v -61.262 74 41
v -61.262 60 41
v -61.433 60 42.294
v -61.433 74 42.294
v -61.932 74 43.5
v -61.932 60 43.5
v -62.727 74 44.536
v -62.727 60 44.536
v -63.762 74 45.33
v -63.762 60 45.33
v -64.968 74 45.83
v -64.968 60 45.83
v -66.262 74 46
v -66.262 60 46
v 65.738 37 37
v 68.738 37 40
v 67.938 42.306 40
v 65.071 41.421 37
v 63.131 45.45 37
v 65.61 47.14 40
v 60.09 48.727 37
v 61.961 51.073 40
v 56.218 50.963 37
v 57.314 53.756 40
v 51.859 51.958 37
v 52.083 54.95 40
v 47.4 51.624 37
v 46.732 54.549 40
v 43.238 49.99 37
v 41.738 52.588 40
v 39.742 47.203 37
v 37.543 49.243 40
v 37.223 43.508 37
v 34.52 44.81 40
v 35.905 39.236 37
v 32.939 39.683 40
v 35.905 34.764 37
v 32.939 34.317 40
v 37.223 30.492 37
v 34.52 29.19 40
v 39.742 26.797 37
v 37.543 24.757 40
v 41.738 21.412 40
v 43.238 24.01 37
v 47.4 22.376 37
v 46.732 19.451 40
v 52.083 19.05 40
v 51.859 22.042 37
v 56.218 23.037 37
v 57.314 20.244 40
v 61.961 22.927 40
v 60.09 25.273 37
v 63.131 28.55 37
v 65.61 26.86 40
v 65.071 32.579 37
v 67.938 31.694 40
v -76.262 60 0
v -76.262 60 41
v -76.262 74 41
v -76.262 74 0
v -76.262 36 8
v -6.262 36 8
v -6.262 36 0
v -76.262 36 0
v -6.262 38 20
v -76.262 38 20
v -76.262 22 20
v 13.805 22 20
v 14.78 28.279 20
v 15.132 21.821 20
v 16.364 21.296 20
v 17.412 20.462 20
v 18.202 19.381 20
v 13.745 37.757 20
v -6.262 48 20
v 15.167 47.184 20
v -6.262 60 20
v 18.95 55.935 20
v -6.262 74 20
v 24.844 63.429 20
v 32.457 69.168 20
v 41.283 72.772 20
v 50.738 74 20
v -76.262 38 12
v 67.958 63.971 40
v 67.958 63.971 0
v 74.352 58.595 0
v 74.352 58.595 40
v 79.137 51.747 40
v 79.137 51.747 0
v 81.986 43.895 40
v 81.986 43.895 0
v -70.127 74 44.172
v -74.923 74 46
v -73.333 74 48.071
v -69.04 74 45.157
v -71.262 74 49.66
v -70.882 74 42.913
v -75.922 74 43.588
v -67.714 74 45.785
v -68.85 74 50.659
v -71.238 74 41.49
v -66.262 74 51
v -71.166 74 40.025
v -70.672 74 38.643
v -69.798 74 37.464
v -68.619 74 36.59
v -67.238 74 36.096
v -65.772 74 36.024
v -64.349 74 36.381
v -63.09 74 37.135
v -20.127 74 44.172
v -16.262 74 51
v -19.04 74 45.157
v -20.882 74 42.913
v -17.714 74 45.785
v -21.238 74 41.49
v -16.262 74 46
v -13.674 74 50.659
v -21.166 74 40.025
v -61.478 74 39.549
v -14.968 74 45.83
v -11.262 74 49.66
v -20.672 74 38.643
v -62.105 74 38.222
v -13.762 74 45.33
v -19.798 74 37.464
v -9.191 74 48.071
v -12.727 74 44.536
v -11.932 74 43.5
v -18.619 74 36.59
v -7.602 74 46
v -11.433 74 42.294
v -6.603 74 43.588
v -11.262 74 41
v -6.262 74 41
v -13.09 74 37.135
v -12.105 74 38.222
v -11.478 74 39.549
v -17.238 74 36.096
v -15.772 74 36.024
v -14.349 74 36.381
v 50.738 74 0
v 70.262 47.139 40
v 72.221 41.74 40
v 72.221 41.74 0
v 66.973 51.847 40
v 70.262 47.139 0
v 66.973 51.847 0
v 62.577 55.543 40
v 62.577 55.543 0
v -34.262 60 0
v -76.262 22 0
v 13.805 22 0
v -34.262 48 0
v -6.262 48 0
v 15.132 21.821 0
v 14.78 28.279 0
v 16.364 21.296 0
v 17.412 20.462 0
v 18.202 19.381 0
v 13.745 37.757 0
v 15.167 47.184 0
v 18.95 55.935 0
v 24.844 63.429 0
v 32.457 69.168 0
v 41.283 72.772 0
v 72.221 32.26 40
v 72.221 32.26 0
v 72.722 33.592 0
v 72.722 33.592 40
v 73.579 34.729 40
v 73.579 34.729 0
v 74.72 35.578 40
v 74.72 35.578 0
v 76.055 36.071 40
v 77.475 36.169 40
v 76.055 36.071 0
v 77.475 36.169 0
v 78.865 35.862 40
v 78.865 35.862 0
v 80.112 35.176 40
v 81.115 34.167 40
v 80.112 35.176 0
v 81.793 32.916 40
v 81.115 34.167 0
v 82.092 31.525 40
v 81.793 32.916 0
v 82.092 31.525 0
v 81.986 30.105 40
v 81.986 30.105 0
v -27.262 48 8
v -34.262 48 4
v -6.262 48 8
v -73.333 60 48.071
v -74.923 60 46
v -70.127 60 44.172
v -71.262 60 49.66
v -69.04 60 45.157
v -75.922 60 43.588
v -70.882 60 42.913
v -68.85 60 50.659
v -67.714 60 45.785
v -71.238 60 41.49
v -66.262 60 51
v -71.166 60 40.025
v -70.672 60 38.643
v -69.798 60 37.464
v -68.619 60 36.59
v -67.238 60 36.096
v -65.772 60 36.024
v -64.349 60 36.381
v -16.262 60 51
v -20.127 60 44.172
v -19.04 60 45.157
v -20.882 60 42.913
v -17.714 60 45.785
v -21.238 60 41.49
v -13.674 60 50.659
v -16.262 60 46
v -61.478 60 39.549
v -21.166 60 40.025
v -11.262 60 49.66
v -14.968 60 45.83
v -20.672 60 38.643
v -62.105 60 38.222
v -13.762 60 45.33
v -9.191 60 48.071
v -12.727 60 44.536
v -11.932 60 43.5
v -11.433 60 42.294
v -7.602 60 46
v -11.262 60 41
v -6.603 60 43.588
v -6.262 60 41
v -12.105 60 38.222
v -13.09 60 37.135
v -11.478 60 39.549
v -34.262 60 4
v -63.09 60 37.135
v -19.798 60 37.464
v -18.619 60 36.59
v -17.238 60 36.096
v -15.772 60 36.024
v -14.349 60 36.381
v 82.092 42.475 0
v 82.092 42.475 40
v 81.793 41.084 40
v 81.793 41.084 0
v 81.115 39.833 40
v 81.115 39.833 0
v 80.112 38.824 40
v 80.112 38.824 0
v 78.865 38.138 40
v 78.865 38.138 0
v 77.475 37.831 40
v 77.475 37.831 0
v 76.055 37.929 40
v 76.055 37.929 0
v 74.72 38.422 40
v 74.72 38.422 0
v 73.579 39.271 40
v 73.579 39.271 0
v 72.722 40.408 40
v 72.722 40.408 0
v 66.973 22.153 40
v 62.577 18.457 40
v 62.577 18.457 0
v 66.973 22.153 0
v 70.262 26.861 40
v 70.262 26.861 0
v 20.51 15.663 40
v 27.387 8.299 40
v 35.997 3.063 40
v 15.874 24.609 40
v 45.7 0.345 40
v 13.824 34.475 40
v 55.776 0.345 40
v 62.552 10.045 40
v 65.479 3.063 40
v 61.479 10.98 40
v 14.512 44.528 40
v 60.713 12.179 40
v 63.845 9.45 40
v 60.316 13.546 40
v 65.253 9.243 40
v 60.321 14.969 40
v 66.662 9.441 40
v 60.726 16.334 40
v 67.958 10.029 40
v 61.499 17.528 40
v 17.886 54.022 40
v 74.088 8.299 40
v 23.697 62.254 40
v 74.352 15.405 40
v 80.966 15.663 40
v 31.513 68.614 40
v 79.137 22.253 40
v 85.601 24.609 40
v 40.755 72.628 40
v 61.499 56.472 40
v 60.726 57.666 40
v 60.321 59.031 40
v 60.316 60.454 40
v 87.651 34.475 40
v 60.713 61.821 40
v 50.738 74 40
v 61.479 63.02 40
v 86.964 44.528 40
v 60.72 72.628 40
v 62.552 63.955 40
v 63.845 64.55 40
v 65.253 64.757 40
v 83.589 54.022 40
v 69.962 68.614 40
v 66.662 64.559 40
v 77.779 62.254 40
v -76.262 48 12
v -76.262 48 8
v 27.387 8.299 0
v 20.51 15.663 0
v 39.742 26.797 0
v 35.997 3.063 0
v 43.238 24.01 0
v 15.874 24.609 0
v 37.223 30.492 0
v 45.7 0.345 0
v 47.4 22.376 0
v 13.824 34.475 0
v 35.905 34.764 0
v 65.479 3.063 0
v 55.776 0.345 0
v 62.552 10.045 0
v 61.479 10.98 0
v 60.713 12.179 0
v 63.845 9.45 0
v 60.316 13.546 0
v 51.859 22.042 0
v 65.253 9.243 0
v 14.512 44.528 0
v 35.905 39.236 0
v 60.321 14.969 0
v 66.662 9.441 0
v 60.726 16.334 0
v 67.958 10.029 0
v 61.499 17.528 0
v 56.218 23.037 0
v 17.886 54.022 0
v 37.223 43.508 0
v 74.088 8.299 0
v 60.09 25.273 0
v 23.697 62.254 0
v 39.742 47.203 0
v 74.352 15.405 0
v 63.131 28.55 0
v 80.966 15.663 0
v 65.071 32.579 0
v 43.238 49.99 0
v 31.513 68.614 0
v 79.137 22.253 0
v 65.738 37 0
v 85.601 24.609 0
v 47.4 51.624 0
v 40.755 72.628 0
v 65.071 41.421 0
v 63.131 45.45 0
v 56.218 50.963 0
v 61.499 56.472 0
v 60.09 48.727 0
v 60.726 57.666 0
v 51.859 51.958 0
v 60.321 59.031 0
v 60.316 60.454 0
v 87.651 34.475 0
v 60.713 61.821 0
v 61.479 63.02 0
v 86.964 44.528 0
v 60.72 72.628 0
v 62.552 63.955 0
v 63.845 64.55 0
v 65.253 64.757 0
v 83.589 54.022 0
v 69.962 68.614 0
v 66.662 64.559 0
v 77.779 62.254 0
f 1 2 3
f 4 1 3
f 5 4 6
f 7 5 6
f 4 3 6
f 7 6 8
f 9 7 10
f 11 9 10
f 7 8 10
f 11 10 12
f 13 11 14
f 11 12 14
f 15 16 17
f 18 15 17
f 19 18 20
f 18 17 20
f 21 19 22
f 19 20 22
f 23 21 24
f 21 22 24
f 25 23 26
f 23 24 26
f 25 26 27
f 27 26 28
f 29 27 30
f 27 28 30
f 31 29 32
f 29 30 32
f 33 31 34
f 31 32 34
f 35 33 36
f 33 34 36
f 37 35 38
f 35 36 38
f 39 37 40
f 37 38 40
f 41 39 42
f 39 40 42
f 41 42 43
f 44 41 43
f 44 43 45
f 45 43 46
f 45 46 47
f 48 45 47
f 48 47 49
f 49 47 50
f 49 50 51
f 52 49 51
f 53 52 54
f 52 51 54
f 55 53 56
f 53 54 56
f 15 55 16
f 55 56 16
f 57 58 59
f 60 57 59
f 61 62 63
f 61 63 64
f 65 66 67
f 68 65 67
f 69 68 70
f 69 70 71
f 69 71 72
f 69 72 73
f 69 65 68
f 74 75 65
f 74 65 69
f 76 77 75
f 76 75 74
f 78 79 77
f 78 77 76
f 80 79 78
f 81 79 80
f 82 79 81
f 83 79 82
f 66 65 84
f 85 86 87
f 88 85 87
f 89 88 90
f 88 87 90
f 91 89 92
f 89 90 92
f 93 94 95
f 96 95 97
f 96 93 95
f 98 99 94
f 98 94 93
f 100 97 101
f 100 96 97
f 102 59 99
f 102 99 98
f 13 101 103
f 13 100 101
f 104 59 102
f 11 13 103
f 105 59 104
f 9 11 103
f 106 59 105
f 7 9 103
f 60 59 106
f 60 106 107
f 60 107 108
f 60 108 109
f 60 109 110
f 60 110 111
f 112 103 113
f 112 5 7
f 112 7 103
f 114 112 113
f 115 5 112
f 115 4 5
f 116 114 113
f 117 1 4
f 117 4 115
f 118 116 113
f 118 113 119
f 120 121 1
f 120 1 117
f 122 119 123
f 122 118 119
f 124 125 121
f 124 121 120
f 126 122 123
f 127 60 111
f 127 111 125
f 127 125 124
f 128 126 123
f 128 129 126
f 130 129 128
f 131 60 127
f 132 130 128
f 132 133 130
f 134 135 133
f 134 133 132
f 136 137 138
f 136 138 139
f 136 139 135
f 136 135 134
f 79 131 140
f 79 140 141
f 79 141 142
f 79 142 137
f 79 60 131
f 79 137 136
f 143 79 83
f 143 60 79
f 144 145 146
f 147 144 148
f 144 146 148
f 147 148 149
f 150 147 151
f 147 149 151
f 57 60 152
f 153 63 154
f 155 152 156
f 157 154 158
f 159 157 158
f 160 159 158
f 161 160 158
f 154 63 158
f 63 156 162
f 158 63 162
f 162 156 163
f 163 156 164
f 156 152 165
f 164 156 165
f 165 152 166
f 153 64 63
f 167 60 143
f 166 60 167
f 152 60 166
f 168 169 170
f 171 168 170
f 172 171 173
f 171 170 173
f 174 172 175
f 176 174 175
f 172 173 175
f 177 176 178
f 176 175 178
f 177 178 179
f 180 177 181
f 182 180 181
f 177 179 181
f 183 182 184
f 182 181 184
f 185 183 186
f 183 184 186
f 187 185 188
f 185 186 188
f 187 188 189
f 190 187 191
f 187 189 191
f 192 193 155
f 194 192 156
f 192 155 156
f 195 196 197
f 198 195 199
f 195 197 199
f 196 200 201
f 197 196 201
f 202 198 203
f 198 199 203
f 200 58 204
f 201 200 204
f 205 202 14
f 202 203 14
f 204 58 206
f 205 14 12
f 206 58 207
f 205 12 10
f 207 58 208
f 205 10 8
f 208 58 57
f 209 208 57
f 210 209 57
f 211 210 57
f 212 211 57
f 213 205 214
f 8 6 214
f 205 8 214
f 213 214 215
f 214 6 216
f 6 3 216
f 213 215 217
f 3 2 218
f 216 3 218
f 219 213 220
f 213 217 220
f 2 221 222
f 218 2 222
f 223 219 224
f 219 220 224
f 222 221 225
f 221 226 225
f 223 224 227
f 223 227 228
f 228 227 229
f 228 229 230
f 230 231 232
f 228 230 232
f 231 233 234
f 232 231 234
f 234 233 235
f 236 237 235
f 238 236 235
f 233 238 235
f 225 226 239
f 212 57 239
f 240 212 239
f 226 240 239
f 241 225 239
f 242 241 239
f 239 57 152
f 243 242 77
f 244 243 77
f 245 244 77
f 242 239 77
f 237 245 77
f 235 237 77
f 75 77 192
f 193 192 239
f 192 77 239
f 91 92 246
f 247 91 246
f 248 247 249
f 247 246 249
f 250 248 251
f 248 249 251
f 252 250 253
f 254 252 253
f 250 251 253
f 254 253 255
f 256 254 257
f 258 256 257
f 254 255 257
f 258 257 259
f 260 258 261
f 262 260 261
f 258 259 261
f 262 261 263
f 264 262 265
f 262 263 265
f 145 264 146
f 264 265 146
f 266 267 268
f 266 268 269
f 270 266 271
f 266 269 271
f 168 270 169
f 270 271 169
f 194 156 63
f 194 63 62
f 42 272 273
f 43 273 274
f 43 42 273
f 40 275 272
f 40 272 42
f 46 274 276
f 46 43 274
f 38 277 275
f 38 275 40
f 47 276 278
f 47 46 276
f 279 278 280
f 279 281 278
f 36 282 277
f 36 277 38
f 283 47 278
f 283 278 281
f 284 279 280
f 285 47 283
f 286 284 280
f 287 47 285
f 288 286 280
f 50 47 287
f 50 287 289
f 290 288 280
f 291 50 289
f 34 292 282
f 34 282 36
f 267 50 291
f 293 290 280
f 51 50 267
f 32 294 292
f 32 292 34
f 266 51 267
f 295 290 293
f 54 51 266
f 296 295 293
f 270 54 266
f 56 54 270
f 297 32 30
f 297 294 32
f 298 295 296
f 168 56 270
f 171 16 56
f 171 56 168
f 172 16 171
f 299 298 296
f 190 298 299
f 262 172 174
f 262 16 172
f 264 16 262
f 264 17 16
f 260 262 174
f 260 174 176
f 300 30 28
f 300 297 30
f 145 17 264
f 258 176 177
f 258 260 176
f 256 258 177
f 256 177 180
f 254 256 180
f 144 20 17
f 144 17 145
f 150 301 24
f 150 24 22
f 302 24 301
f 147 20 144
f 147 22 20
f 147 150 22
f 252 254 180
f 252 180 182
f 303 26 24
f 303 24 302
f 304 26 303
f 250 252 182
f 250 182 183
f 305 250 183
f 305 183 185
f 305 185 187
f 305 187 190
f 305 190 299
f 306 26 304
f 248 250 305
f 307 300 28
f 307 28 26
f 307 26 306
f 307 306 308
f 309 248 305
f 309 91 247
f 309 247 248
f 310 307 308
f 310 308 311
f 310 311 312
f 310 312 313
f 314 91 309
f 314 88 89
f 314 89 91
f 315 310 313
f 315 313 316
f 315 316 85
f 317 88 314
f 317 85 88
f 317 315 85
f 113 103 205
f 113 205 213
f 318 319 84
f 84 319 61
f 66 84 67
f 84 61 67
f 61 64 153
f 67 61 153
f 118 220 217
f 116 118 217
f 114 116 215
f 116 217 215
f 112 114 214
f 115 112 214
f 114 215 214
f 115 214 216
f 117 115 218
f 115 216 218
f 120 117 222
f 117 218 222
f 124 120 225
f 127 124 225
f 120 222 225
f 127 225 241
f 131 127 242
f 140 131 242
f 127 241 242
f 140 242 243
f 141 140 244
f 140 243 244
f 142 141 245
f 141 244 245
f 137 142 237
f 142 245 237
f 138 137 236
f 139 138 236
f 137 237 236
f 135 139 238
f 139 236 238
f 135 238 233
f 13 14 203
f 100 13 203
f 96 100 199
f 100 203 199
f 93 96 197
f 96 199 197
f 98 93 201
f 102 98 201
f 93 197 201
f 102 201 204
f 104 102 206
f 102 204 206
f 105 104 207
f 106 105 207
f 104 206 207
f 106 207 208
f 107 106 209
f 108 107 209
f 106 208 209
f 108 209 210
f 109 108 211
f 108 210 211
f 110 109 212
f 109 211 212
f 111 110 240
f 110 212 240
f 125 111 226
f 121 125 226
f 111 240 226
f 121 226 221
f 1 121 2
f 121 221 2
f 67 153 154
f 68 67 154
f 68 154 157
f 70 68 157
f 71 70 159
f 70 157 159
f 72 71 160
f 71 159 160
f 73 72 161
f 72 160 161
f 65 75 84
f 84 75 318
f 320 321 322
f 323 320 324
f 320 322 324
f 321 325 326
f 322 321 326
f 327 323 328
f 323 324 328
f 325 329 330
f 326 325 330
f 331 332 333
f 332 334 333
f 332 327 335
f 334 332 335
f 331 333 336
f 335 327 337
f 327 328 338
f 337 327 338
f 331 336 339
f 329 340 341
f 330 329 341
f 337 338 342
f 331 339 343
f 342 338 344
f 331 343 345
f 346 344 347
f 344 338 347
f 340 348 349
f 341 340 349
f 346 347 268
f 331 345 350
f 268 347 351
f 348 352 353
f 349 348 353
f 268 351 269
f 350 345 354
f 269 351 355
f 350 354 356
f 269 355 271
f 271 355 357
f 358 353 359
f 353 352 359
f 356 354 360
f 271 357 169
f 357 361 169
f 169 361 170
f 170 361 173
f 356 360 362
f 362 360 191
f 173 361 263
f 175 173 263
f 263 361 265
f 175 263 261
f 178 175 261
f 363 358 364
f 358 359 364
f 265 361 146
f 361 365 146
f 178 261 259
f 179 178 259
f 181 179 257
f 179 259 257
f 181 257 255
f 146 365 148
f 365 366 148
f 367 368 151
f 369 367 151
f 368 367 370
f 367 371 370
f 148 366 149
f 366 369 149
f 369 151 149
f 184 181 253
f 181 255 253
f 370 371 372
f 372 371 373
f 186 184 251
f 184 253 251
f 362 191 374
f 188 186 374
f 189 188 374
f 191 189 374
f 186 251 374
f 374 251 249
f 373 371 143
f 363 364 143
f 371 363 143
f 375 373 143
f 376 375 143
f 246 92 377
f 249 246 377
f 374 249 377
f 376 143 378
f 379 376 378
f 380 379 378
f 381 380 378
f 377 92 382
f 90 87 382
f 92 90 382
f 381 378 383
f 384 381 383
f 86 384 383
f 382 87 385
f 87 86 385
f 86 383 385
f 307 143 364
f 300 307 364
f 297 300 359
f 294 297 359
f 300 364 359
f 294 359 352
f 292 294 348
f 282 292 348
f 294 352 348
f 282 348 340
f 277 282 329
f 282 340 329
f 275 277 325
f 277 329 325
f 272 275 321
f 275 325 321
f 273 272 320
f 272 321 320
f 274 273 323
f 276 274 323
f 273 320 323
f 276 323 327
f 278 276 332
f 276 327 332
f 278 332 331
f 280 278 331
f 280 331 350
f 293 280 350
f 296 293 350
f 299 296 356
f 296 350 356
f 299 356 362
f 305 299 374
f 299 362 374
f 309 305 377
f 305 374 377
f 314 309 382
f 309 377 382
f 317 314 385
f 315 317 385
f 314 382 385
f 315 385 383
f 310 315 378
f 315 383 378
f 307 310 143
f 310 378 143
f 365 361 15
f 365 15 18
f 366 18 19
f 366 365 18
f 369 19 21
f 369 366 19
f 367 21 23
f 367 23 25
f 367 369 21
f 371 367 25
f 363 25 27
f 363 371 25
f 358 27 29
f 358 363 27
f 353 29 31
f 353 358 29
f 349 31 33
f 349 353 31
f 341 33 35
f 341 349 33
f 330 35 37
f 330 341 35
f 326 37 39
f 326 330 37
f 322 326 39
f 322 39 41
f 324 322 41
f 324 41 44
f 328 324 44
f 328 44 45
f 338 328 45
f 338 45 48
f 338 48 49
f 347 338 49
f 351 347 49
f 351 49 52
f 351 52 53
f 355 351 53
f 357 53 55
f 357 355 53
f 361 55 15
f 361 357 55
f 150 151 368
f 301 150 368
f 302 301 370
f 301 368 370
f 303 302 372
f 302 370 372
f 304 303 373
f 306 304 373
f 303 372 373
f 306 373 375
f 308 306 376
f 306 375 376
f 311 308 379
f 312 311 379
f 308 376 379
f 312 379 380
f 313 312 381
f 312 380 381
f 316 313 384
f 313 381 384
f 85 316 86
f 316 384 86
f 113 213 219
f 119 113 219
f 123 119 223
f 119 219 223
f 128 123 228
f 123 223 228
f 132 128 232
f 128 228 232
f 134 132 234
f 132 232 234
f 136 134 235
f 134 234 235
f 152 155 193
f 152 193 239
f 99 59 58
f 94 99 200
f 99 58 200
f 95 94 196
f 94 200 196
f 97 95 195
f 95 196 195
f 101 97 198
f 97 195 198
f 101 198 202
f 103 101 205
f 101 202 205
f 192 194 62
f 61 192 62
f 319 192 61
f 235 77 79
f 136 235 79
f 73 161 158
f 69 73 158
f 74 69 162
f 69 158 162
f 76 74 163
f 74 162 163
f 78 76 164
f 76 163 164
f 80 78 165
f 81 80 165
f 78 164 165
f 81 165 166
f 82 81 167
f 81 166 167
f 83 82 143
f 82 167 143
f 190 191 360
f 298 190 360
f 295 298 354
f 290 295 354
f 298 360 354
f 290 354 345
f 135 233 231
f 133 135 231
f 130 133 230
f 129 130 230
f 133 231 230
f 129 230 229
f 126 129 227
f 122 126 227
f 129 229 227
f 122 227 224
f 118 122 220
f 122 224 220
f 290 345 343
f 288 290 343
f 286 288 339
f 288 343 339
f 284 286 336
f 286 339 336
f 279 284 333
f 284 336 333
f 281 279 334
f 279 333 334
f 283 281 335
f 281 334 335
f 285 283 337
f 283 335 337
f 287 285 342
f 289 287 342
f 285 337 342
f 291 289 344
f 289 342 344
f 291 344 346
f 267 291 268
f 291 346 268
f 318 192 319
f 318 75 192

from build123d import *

# Parameters (mm, degrees)
F0_R         = 15
F1_DEPTH     = 40
F2_DEPTH     = 20
F4_DEPTH     = 10
F3_W         = 70
F3_H         = 8
F5_DEPTH     = 12
F6_W         = 70
F6_H         = 14
F7_DEPTH     = 31
F9_DEPTH     = 14.001
F0_W         = 28
F0_H         = 12
F10_DEPTH    = 20
F11_T1_DEPTH = 12
F12_SIZE     = 3


# Not quite as in the source:
# - a fillet or chamfer that OpenCascade refuses, or shapes differently, is made with other operations: its cross-section is extruded or revolved along the edge and cut away or added
# - a feature names something its author has since deleted; it is built from what else it names


with BuildPart() as f1:
    # F0 (on Top) → F1 (new body)
    with BuildSketch(Plane.XY):
        with BuildLine():
            ThreePointArc((18.202077895, 19.380952381), (59.8256579019, 1.1334458447), (87.7377377315, 37))
            ThreePointArc((87.7377377315, 37), (76.9006886354, 63.1629509039), (50.7377377315, 74))
            ThreePointArc((50.7377377315, 74), (18.9501240911, 55.9353536816), (18.202077895, 19.380952381))
        make_face()
        with BuildLine():
            ThreePointArc((81.9861465659, 30.1052958497), (76.9690140278, 18.6718756042), (67.9584074606, 10.028746153))
            ThreePointArc((67.9584074606, 10.028746153), (61.0534194019, 11.5522749214), (62.5769481703, 18.4572629802))
            ThreePointArc((62.5769481703, 18.4572629802), (28.7377377315, 37), (62.5769481703, 55.5427370198))
            ThreePointArc((62.5769481703, 55.5427370198), (61.0534194019, 62.4477250786), (67.9584074606, 63.971253847))
            ThreePointArc((67.9584074606, 63.971253847), (76.9690140278, 55.3281243958), (81.9861465659, 43.8947041503))
            ThreePointArc((81.9861465659, 43.8947041503), (78.180880209, 37.9348427464), (72.2210188051, 41.7401091033))
            ThreePointArc((72.2210188051, 41.7401091033), (72.6081764973, 39.3840948366), (72.7377377315, 37))
            ThreePointArc((72.7377377315, 37), (72.6081764973, 34.6159051634), (72.2210188051, 32.2598908967))
            ThreePointArc((72.2210188051, 32.2598908967), (78.180880209, 36.0651572536), (81.9861465659, 30.1052958497))
        make_face(mode=Mode.SUBTRACT)
        with BuildLine():
            ThreePointArc((62.5769481703, 55.5427370198), (28.7377377315, 37), (62.5769481703, 18.4572629802))
            ThreePointArc((62.5769481703, 18.4572629802), (68.7717401852, 24.3994144779), (72.2210188051, 32.2598908967))
            ThreePointArc((72.2210188051, 32.2598908967), (72.6081764973, 34.6159051634), (72.7377377315, 37))
            ThreePointArc((72.7377377315, 37), (72.6081764973, 39.3840948366), (72.2210188051, 41.7401091033))
            ThreePointArc((72.2210188051, 41.7401091033), (68.7717401852, 49.6005855221), (62.5769481703, 55.5427370198))
        make_face()
        with Locations((50.7377377315, 37)):
            Circle(F0_R, mode=Mode.SUBTRACT)
    extrude(amount=F1_DEPTH)

    # F12
    f12_edges = [f1.edges().sort_by_distance(p)[0] for p in [
        (35.737738, 37, 40),
    ]]
    chamfer(f12_edges, length=F12_SIZE)


with BuildPart() as f2:
    # F0 (on Top) → F2 (new body)
    with BuildSketch(Plane.XY):
        with BuildLine():
            ThreePointArc((18.202077895, 19.380952381), (18.9501240911, 55.9353536816), (50.7377377315, 74))
            Line((50.7377377315, 74), (-6.2622622685, 74))
            Line((-6.2622622685, 74), (-6.2622622685, 60))
            Line((-6.2622622685, 60), (-6.2622622685, 48))
            Line((-6.2622622685, 48), (-6.2622622685, 36))
            Line((-6.2622622685, 36), (-6.2622622685, 22))
            Line((-6.2622622685, 22), (13.8053671063, 22))
            ThreePointArc((13.8053671063, 22), (16.3641986849, 21.2956234649), (18.202077895, 19.380952381))
        make_face()
        Polygon((-12.395917438, 22), (-6.2622622685, 22), (-6.2622622685, 36), (-76.2622622685, 36), (-76.2622622685, 22), align=None)
        Polygon((-6.2622622685, 36), (-6.2622622685, 48), (-34.2622622685, 48), (-76.2622622685, 48), (-76.2622622685, 36), align=None)
        Polygon((-6.2622622685, 60), (-6.2622622685, 74), (-76.2622622685, 74), (-76.2622622685, 60), (-34.2622622685, 60), align=None)
    extrude(amount=F2_DEPTH)

    # F3 (on face) → F4 (cut)
    with BuildSketch(Plane(origin=(0, 48, 0), x_dir=(-1, 0, 0), z_dir=(0, 1, 0))):
        Polygon((76.2622622685, 12), (76.2622622685, 20), (6.2622622685, 20), align=None)
    extrude(amount=-F4_DEPTH, mode=Mode.SUBTRACT)

    # F3 (on face) → F5 (cut)
    with BuildSketch(Plane(origin=(0, 48, 0), x_dir=(-1, 0, 0), z_dir=(0, 1, 0))):
        with Locations((41.2622622685, 4)):
            Rectangle(F3_W, F3_H)
    extrude(amount=-F5_DEPTH, mode=Mode.SUBTRACT)

    # F6 (on face) → F7 (join)
    with BuildSketch(Plane.XY.offset(20)):
        with Locations((-41.2622622685, 67)):
            Rectangle(F6_W, F6_H)
    extrude(amount=F7_DEPTH)

    # F8 (on face) → F9 (cut, through all)
    with BuildSketch(Plane.XZ.offset(-60)):
        with BuildLine():
            ThreePointArc((-61.2622622685, 41), (-62.7267283626, 44.5355339059), (-66.2622622685, 46))
            ThreePointArc((-66.2622622685, 46), (-69.7977961744, 37.4644660941), (-61.2622622685, 41))
        make_face()
        with BuildLine():
            ThreePointArc((-76.2622622685, 41), (-73.3333300804, 48.0710678119), (-66.2622622685, 51))
            Line((-66.2622622685, 51), (-76.2622622685, 51))
            Line((-76.2622622685, 51), (-76.2622622685, 41))
        make_face()
        with BuildLine():
            Line((-6.2622622685, 41), (-6.2622622685, 51))
            Line((-6.2622622685, 51), (-16.2622622685, 51))
            ThreePointArc((-16.2622622685, 51), (-9.1911944566, 48.0710678119), (-6.2622622685, 41))
        make_face()
        with BuildLine():
            ThreePointArc((-11.2622622685, 41), (-12.7267283626, 44.5355339059), (-16.2622622685, 46))
            ThreePointArc((-16.2622622685, 46), (-19.7977961744, 37.4644660941), (-11.2622622685, 41))
        make_face()
    extrude(amount=-F9_DEPTH, mode=Mode.SUBTRACT)

    # F0 (on Top) → F10 (join)
    with BuildSketch(Plane.XY):
        with Locations((-20.2622622685, 54)):
            Rectangle(F0_W, F0_H)
    extrude(amount=F10_DEPTH)

    # F11: chamfer of 28 x 16 on 1 edges, made by hand

    # F11_s2 → F11_t1 (cut)
    with BuildSketch(Plane.XZ.offset(-60)):
        Polygon((-6.2622622685, 20), (-34.2622622685, 4), (-34.2622622685, 20), align=None)
    extrude(amount=F11_T1_DEPTH, mode=Mode.SUBTRACT)


solid = Compound([f1.part, f2.part])
